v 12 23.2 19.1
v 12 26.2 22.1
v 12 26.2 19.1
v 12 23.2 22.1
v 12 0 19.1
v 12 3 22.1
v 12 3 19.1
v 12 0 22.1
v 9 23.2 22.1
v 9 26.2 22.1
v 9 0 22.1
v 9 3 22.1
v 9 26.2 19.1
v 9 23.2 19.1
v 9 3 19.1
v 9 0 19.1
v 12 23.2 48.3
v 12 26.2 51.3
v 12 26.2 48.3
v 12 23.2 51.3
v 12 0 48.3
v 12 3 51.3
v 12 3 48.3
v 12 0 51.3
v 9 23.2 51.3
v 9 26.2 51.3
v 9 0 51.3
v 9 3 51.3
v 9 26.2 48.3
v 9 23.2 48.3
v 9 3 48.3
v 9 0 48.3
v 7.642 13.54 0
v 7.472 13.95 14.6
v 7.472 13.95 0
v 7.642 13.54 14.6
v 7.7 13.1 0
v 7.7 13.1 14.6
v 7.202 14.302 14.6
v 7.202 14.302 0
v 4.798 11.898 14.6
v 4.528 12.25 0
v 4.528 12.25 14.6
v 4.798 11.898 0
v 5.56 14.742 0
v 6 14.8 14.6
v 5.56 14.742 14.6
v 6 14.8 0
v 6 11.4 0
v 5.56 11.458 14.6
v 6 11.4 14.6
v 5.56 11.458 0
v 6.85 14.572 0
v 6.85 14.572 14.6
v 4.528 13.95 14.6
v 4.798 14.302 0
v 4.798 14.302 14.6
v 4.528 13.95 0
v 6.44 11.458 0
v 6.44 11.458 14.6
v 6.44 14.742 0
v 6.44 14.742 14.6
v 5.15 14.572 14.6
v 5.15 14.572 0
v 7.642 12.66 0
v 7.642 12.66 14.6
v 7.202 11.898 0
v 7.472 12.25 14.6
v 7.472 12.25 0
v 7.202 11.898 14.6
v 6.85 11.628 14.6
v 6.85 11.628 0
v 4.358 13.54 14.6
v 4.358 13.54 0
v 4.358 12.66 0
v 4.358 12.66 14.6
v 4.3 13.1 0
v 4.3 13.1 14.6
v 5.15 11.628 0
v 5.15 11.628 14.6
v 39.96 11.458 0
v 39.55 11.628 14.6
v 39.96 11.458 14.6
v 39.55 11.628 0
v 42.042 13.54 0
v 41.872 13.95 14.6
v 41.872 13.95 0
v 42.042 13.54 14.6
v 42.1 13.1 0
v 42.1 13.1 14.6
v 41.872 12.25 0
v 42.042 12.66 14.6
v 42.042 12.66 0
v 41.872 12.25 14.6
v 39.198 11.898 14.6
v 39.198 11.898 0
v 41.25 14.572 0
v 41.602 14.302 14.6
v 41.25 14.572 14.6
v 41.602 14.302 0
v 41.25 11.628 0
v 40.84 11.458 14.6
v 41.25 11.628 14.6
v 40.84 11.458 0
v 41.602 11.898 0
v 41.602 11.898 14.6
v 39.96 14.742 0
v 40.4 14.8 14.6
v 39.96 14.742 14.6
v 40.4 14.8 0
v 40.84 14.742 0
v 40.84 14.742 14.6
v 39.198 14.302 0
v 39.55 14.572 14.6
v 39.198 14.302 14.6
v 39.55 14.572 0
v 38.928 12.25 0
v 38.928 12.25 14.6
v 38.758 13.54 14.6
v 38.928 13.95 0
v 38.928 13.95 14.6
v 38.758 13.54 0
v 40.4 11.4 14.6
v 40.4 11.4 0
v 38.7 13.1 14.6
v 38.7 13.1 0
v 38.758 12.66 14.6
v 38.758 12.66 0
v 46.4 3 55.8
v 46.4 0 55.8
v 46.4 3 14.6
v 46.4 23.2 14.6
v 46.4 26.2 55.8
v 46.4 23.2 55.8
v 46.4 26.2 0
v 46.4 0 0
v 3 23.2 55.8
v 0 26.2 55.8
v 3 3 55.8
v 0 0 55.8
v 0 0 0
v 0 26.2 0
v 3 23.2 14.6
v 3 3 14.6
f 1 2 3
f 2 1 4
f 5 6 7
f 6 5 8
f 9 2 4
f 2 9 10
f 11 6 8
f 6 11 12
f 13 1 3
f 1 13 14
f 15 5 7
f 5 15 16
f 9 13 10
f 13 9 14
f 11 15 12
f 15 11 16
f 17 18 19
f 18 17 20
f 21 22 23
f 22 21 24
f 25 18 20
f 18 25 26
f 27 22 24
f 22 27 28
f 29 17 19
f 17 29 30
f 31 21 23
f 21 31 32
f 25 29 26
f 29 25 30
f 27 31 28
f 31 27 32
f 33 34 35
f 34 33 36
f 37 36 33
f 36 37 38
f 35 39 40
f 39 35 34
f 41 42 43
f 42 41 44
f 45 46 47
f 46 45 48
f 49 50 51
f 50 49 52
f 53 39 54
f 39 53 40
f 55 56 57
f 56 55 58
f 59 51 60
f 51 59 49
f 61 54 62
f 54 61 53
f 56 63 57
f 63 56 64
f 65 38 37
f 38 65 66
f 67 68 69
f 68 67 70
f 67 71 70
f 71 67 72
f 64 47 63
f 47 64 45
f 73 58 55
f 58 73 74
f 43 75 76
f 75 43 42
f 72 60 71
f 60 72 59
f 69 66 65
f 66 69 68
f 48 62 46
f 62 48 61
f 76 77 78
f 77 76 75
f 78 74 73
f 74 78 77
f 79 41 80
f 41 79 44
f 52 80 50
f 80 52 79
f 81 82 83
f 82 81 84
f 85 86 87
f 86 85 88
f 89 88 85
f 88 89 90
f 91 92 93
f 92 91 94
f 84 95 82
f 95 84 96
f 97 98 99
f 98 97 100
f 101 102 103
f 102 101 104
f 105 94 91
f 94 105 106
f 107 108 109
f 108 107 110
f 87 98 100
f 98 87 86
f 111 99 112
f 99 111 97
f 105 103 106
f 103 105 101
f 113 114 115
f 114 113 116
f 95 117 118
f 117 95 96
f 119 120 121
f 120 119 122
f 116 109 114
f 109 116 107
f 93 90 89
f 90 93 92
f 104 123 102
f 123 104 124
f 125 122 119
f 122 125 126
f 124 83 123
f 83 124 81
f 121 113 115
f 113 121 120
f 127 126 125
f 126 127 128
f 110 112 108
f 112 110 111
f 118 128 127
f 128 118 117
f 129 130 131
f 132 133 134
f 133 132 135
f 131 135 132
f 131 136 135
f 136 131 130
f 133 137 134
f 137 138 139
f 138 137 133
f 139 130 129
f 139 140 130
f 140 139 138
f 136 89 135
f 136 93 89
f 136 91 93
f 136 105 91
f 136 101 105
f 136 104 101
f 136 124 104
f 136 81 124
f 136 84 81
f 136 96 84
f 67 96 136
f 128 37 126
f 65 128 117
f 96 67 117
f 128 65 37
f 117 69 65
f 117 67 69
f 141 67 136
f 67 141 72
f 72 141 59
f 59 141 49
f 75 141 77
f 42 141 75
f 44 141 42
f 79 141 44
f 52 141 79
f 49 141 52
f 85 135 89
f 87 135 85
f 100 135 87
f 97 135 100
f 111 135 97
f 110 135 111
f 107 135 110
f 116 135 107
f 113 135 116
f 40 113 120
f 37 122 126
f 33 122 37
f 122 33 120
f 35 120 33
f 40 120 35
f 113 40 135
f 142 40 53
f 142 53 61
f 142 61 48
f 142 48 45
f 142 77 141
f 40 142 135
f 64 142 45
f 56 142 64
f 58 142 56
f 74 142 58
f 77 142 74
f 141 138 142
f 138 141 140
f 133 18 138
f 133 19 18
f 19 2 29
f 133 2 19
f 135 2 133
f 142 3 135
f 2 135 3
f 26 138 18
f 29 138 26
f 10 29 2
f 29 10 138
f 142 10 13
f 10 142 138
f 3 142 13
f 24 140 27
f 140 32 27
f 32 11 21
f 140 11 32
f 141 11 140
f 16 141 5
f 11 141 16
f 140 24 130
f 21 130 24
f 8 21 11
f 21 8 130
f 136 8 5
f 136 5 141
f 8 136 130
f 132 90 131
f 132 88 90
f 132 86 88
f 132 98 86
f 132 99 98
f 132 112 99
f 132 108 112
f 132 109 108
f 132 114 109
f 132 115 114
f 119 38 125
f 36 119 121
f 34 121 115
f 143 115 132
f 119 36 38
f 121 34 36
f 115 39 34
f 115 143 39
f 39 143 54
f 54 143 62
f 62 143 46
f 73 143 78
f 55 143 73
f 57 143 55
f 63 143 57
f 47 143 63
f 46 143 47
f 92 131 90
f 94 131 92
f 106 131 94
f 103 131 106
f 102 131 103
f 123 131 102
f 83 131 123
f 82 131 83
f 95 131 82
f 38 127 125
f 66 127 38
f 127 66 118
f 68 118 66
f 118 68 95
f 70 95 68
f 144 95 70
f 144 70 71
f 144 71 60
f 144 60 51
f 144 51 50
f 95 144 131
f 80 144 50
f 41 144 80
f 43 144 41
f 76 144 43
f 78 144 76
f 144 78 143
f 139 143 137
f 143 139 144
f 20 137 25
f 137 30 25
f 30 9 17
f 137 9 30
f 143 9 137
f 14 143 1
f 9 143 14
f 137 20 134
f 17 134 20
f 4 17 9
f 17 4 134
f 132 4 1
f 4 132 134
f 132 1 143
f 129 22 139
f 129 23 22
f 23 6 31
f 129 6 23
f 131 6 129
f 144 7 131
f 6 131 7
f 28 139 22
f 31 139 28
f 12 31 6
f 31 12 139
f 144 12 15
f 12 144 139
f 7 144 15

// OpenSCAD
// file: params_v2.scad
// ============================================================
// Cat Bowl v1 — Round Bowl + Dual Trapdoor Flaps (piano-hinge)
// params_v2.scad — all key dimensions live here
// ============================================================
// NOTE: Independent of the old params.scad (rectangular body /
// halo antenna / hopper design). This is a clean start for the
// current hardware: round 108mm bowl + 2x MG996R servos.
// ============================================================

$fn = 64;

// ---- Bowl (as given: 108mm diameter, 40mm deep) ----
BOWL_DIA      = 108;
BOWL_DEPTH    = 40;
BOWL_RADIUS   = BOWL_DIA / 2;

// ---- Base block (square footprint, round pocket inside) ----
WALL          = 6;                       // wall thickness around bowl pocket
FLOOR_T       = 4;                       // floor thickness under bowl
BASE_SIZE     = BOWL_DIA + 2 * WALL;     // 120mm square
BASE_HEIGHT   = BOWL_DEPTH + FLOOR_T;    // 44mm — top of base = hinge rod height

// ---- Flap (two rectangular flaps, each covers half the top) ----
FLAP_LEN      = BASE_SIZE;               // runs full width along hinge edge (120mm)
FLAP_OVERLAP  = 4;                       // extra reach past centerline for sealing
FLAP_DEPTH    = BASE_SIZE / 2 + FLAP_OVERLAP;  // 64mm
FLAP_T        = 3;                       // flap panel thickness

// ---- Piano hinge (rod + knuckles) ----
ROD_D         = 4;                       // steel/brass rod diameter (verify what you have)
ROD_CLEARANCE = 0.4;                     // bearing clearance for knuckles that spin freely
KNUCKLE_OD    = ROD_D + 6;               // 10mm knuckle outer diameter
KNUCKLE_LEN   = 18;                      // length of each knuckle segment
KNUCKLE_GAP   = 4;                       // gap between knuckle segments
// Alternating pattern along the FLAP_LEN edge: base-flap-base-flap-base (5 segments)
// 3 fixed (base) knuckles + 2 rotating (flap) knuckles, interleaved
ROD_END_PROTRUDE = 12;                   // rod extends past the base footprint for servo coupling
ROD_LENGTH    = FLAP_LEN + 2 * ROD_END_PROTRUDE;
// Rod axis sits at the flap's mid-thickness height when the flap is closed
// and resting on top of the base — NOT at the bare top surface.
ROD_AXIS_Z    = BASE_HEIGHT + FLAP_T / 2;

// ---- MG996R servo (verify with calipers once yours arrive) ----
SERVO_W       = 40.7;   // body length
SERVO_D       = 19.7;   // body width/depth
SERVO_H       = 42.9;   // body height (shaft side up)
SERVO_SHAFT_OFFSET = 30.9; // distance from back edge to shaft, along SERVO_W
SERVO_TAB_SPAN = 54.5;  // outer tab-to-tab width
SERVO_TAB_HOLE_SPACING = 10; // hole spacing within each tab
SERVO_HORN_OD = 24;     // round disc horn diameter (verify)
SERVO_HORN_BOLT_CIRCLE = 19; // horn screw hole circle diameter (verify)

// ---- Mounting hardware ----
M3_CLEAR      = 3.4;    // M3 clearance hole
M3_HEAD       = 6.2;    // M3 pan head clearance
// main file
// ============================================================
// 22_servo_mount_v2.scad — MG996R bracket, shaft aligned to rod
// The servo is rotated 90° from its usual orientation so the
// output shaft points sideways (along +X) into the rod/coupler,
// instead of the usual "shaft points up" mounting.
//
// Pocket is open on TOP (drop the servo in) and open on the
// FRONT/+X face (shaft + horn protrude toward the base). Servo
// is held with zip-tie slots rather than modeled ear-mount holes,
// since exact ear spacing varies by MG996R clone — verify yours
// with calipers; zip ties are forgiving of small errors for v1.
//
// Print orientation: as-is, flat on the bed.
// ============================================================
include <params_v2.scad>

WALL2   = 3;
TOL     = 0.5;   // pocket clearance around servo body

// after 90° remap: X-extent(depth into bracket)=SERVO_H, Y-extent=SERVO_D, Z-extent=SERVO_W
POCKET_X = SERVO_H + TOL;
POCKET_Y = SERVO_D + TOL;
POCKET_Z = SERVO_W + TOL;

// shaft sits 30.9mm up from the pocket's "bottom" (see params_v2 SERVO_SHAFT_OFFSET)
POCKET_BOTTOM_Z = ROD_AXIS_Z - SERVO_SHAFT_OFFSET;

BX = WALL2 + POCKET_X;              // back wall + pocket depth (front left open)
BY = POCKET_Y + 2 * WALL2;          // side walls both sides
BZ = POCKET_BOTTOM_Z + POCKET_Z;    // pedestal + pocket height (top left open)

module servo_pocket() {
    translate([WALL2, WALL2, POCKET_BOTTOM_Z])
        cube([POCKET_X + 5, POCKET_Y, POCKET_Z + 5]); // +5 extends through front & top (open)
}

module ziptie_slots() {
    // two slot pairs (through both side walls), one near pocket bottom, one near top
    for (z = [POCKET_BOTTOM_Z + 6, POCKET_BOTTOM_Z + POCKET_Z - 6]) {
        translate([WALL2 + 6, -1, z - 1.5])
            cube([3, BY + 2, 3]);
    }
}

module mount_holes() {
    // 2x M3 through the pedestal, for screwing bracket to a shared platform/board
    for (x = [6, BX - 6])
        translate([x, BY / 2, -0.1])
            cylinder(d = M3_CLEAR, h = POCKET_BOTTOM_Z + 0.2, $fn = 24);
}

module servo_bracket() {
    difference() {
        cube([BX, BY, BZ]);
        servo_pocket();
        ziptie_slots();
        mount_holes();
    }
}

servo_bracket();

// ---- reference: where the shaft/horn ends up in world coords (for the assembly) ----
echo("Servo shaft center (local bracket coords): X =", BX, " Y =", BY/2, " Z =", ROD_AXIS_Z);
